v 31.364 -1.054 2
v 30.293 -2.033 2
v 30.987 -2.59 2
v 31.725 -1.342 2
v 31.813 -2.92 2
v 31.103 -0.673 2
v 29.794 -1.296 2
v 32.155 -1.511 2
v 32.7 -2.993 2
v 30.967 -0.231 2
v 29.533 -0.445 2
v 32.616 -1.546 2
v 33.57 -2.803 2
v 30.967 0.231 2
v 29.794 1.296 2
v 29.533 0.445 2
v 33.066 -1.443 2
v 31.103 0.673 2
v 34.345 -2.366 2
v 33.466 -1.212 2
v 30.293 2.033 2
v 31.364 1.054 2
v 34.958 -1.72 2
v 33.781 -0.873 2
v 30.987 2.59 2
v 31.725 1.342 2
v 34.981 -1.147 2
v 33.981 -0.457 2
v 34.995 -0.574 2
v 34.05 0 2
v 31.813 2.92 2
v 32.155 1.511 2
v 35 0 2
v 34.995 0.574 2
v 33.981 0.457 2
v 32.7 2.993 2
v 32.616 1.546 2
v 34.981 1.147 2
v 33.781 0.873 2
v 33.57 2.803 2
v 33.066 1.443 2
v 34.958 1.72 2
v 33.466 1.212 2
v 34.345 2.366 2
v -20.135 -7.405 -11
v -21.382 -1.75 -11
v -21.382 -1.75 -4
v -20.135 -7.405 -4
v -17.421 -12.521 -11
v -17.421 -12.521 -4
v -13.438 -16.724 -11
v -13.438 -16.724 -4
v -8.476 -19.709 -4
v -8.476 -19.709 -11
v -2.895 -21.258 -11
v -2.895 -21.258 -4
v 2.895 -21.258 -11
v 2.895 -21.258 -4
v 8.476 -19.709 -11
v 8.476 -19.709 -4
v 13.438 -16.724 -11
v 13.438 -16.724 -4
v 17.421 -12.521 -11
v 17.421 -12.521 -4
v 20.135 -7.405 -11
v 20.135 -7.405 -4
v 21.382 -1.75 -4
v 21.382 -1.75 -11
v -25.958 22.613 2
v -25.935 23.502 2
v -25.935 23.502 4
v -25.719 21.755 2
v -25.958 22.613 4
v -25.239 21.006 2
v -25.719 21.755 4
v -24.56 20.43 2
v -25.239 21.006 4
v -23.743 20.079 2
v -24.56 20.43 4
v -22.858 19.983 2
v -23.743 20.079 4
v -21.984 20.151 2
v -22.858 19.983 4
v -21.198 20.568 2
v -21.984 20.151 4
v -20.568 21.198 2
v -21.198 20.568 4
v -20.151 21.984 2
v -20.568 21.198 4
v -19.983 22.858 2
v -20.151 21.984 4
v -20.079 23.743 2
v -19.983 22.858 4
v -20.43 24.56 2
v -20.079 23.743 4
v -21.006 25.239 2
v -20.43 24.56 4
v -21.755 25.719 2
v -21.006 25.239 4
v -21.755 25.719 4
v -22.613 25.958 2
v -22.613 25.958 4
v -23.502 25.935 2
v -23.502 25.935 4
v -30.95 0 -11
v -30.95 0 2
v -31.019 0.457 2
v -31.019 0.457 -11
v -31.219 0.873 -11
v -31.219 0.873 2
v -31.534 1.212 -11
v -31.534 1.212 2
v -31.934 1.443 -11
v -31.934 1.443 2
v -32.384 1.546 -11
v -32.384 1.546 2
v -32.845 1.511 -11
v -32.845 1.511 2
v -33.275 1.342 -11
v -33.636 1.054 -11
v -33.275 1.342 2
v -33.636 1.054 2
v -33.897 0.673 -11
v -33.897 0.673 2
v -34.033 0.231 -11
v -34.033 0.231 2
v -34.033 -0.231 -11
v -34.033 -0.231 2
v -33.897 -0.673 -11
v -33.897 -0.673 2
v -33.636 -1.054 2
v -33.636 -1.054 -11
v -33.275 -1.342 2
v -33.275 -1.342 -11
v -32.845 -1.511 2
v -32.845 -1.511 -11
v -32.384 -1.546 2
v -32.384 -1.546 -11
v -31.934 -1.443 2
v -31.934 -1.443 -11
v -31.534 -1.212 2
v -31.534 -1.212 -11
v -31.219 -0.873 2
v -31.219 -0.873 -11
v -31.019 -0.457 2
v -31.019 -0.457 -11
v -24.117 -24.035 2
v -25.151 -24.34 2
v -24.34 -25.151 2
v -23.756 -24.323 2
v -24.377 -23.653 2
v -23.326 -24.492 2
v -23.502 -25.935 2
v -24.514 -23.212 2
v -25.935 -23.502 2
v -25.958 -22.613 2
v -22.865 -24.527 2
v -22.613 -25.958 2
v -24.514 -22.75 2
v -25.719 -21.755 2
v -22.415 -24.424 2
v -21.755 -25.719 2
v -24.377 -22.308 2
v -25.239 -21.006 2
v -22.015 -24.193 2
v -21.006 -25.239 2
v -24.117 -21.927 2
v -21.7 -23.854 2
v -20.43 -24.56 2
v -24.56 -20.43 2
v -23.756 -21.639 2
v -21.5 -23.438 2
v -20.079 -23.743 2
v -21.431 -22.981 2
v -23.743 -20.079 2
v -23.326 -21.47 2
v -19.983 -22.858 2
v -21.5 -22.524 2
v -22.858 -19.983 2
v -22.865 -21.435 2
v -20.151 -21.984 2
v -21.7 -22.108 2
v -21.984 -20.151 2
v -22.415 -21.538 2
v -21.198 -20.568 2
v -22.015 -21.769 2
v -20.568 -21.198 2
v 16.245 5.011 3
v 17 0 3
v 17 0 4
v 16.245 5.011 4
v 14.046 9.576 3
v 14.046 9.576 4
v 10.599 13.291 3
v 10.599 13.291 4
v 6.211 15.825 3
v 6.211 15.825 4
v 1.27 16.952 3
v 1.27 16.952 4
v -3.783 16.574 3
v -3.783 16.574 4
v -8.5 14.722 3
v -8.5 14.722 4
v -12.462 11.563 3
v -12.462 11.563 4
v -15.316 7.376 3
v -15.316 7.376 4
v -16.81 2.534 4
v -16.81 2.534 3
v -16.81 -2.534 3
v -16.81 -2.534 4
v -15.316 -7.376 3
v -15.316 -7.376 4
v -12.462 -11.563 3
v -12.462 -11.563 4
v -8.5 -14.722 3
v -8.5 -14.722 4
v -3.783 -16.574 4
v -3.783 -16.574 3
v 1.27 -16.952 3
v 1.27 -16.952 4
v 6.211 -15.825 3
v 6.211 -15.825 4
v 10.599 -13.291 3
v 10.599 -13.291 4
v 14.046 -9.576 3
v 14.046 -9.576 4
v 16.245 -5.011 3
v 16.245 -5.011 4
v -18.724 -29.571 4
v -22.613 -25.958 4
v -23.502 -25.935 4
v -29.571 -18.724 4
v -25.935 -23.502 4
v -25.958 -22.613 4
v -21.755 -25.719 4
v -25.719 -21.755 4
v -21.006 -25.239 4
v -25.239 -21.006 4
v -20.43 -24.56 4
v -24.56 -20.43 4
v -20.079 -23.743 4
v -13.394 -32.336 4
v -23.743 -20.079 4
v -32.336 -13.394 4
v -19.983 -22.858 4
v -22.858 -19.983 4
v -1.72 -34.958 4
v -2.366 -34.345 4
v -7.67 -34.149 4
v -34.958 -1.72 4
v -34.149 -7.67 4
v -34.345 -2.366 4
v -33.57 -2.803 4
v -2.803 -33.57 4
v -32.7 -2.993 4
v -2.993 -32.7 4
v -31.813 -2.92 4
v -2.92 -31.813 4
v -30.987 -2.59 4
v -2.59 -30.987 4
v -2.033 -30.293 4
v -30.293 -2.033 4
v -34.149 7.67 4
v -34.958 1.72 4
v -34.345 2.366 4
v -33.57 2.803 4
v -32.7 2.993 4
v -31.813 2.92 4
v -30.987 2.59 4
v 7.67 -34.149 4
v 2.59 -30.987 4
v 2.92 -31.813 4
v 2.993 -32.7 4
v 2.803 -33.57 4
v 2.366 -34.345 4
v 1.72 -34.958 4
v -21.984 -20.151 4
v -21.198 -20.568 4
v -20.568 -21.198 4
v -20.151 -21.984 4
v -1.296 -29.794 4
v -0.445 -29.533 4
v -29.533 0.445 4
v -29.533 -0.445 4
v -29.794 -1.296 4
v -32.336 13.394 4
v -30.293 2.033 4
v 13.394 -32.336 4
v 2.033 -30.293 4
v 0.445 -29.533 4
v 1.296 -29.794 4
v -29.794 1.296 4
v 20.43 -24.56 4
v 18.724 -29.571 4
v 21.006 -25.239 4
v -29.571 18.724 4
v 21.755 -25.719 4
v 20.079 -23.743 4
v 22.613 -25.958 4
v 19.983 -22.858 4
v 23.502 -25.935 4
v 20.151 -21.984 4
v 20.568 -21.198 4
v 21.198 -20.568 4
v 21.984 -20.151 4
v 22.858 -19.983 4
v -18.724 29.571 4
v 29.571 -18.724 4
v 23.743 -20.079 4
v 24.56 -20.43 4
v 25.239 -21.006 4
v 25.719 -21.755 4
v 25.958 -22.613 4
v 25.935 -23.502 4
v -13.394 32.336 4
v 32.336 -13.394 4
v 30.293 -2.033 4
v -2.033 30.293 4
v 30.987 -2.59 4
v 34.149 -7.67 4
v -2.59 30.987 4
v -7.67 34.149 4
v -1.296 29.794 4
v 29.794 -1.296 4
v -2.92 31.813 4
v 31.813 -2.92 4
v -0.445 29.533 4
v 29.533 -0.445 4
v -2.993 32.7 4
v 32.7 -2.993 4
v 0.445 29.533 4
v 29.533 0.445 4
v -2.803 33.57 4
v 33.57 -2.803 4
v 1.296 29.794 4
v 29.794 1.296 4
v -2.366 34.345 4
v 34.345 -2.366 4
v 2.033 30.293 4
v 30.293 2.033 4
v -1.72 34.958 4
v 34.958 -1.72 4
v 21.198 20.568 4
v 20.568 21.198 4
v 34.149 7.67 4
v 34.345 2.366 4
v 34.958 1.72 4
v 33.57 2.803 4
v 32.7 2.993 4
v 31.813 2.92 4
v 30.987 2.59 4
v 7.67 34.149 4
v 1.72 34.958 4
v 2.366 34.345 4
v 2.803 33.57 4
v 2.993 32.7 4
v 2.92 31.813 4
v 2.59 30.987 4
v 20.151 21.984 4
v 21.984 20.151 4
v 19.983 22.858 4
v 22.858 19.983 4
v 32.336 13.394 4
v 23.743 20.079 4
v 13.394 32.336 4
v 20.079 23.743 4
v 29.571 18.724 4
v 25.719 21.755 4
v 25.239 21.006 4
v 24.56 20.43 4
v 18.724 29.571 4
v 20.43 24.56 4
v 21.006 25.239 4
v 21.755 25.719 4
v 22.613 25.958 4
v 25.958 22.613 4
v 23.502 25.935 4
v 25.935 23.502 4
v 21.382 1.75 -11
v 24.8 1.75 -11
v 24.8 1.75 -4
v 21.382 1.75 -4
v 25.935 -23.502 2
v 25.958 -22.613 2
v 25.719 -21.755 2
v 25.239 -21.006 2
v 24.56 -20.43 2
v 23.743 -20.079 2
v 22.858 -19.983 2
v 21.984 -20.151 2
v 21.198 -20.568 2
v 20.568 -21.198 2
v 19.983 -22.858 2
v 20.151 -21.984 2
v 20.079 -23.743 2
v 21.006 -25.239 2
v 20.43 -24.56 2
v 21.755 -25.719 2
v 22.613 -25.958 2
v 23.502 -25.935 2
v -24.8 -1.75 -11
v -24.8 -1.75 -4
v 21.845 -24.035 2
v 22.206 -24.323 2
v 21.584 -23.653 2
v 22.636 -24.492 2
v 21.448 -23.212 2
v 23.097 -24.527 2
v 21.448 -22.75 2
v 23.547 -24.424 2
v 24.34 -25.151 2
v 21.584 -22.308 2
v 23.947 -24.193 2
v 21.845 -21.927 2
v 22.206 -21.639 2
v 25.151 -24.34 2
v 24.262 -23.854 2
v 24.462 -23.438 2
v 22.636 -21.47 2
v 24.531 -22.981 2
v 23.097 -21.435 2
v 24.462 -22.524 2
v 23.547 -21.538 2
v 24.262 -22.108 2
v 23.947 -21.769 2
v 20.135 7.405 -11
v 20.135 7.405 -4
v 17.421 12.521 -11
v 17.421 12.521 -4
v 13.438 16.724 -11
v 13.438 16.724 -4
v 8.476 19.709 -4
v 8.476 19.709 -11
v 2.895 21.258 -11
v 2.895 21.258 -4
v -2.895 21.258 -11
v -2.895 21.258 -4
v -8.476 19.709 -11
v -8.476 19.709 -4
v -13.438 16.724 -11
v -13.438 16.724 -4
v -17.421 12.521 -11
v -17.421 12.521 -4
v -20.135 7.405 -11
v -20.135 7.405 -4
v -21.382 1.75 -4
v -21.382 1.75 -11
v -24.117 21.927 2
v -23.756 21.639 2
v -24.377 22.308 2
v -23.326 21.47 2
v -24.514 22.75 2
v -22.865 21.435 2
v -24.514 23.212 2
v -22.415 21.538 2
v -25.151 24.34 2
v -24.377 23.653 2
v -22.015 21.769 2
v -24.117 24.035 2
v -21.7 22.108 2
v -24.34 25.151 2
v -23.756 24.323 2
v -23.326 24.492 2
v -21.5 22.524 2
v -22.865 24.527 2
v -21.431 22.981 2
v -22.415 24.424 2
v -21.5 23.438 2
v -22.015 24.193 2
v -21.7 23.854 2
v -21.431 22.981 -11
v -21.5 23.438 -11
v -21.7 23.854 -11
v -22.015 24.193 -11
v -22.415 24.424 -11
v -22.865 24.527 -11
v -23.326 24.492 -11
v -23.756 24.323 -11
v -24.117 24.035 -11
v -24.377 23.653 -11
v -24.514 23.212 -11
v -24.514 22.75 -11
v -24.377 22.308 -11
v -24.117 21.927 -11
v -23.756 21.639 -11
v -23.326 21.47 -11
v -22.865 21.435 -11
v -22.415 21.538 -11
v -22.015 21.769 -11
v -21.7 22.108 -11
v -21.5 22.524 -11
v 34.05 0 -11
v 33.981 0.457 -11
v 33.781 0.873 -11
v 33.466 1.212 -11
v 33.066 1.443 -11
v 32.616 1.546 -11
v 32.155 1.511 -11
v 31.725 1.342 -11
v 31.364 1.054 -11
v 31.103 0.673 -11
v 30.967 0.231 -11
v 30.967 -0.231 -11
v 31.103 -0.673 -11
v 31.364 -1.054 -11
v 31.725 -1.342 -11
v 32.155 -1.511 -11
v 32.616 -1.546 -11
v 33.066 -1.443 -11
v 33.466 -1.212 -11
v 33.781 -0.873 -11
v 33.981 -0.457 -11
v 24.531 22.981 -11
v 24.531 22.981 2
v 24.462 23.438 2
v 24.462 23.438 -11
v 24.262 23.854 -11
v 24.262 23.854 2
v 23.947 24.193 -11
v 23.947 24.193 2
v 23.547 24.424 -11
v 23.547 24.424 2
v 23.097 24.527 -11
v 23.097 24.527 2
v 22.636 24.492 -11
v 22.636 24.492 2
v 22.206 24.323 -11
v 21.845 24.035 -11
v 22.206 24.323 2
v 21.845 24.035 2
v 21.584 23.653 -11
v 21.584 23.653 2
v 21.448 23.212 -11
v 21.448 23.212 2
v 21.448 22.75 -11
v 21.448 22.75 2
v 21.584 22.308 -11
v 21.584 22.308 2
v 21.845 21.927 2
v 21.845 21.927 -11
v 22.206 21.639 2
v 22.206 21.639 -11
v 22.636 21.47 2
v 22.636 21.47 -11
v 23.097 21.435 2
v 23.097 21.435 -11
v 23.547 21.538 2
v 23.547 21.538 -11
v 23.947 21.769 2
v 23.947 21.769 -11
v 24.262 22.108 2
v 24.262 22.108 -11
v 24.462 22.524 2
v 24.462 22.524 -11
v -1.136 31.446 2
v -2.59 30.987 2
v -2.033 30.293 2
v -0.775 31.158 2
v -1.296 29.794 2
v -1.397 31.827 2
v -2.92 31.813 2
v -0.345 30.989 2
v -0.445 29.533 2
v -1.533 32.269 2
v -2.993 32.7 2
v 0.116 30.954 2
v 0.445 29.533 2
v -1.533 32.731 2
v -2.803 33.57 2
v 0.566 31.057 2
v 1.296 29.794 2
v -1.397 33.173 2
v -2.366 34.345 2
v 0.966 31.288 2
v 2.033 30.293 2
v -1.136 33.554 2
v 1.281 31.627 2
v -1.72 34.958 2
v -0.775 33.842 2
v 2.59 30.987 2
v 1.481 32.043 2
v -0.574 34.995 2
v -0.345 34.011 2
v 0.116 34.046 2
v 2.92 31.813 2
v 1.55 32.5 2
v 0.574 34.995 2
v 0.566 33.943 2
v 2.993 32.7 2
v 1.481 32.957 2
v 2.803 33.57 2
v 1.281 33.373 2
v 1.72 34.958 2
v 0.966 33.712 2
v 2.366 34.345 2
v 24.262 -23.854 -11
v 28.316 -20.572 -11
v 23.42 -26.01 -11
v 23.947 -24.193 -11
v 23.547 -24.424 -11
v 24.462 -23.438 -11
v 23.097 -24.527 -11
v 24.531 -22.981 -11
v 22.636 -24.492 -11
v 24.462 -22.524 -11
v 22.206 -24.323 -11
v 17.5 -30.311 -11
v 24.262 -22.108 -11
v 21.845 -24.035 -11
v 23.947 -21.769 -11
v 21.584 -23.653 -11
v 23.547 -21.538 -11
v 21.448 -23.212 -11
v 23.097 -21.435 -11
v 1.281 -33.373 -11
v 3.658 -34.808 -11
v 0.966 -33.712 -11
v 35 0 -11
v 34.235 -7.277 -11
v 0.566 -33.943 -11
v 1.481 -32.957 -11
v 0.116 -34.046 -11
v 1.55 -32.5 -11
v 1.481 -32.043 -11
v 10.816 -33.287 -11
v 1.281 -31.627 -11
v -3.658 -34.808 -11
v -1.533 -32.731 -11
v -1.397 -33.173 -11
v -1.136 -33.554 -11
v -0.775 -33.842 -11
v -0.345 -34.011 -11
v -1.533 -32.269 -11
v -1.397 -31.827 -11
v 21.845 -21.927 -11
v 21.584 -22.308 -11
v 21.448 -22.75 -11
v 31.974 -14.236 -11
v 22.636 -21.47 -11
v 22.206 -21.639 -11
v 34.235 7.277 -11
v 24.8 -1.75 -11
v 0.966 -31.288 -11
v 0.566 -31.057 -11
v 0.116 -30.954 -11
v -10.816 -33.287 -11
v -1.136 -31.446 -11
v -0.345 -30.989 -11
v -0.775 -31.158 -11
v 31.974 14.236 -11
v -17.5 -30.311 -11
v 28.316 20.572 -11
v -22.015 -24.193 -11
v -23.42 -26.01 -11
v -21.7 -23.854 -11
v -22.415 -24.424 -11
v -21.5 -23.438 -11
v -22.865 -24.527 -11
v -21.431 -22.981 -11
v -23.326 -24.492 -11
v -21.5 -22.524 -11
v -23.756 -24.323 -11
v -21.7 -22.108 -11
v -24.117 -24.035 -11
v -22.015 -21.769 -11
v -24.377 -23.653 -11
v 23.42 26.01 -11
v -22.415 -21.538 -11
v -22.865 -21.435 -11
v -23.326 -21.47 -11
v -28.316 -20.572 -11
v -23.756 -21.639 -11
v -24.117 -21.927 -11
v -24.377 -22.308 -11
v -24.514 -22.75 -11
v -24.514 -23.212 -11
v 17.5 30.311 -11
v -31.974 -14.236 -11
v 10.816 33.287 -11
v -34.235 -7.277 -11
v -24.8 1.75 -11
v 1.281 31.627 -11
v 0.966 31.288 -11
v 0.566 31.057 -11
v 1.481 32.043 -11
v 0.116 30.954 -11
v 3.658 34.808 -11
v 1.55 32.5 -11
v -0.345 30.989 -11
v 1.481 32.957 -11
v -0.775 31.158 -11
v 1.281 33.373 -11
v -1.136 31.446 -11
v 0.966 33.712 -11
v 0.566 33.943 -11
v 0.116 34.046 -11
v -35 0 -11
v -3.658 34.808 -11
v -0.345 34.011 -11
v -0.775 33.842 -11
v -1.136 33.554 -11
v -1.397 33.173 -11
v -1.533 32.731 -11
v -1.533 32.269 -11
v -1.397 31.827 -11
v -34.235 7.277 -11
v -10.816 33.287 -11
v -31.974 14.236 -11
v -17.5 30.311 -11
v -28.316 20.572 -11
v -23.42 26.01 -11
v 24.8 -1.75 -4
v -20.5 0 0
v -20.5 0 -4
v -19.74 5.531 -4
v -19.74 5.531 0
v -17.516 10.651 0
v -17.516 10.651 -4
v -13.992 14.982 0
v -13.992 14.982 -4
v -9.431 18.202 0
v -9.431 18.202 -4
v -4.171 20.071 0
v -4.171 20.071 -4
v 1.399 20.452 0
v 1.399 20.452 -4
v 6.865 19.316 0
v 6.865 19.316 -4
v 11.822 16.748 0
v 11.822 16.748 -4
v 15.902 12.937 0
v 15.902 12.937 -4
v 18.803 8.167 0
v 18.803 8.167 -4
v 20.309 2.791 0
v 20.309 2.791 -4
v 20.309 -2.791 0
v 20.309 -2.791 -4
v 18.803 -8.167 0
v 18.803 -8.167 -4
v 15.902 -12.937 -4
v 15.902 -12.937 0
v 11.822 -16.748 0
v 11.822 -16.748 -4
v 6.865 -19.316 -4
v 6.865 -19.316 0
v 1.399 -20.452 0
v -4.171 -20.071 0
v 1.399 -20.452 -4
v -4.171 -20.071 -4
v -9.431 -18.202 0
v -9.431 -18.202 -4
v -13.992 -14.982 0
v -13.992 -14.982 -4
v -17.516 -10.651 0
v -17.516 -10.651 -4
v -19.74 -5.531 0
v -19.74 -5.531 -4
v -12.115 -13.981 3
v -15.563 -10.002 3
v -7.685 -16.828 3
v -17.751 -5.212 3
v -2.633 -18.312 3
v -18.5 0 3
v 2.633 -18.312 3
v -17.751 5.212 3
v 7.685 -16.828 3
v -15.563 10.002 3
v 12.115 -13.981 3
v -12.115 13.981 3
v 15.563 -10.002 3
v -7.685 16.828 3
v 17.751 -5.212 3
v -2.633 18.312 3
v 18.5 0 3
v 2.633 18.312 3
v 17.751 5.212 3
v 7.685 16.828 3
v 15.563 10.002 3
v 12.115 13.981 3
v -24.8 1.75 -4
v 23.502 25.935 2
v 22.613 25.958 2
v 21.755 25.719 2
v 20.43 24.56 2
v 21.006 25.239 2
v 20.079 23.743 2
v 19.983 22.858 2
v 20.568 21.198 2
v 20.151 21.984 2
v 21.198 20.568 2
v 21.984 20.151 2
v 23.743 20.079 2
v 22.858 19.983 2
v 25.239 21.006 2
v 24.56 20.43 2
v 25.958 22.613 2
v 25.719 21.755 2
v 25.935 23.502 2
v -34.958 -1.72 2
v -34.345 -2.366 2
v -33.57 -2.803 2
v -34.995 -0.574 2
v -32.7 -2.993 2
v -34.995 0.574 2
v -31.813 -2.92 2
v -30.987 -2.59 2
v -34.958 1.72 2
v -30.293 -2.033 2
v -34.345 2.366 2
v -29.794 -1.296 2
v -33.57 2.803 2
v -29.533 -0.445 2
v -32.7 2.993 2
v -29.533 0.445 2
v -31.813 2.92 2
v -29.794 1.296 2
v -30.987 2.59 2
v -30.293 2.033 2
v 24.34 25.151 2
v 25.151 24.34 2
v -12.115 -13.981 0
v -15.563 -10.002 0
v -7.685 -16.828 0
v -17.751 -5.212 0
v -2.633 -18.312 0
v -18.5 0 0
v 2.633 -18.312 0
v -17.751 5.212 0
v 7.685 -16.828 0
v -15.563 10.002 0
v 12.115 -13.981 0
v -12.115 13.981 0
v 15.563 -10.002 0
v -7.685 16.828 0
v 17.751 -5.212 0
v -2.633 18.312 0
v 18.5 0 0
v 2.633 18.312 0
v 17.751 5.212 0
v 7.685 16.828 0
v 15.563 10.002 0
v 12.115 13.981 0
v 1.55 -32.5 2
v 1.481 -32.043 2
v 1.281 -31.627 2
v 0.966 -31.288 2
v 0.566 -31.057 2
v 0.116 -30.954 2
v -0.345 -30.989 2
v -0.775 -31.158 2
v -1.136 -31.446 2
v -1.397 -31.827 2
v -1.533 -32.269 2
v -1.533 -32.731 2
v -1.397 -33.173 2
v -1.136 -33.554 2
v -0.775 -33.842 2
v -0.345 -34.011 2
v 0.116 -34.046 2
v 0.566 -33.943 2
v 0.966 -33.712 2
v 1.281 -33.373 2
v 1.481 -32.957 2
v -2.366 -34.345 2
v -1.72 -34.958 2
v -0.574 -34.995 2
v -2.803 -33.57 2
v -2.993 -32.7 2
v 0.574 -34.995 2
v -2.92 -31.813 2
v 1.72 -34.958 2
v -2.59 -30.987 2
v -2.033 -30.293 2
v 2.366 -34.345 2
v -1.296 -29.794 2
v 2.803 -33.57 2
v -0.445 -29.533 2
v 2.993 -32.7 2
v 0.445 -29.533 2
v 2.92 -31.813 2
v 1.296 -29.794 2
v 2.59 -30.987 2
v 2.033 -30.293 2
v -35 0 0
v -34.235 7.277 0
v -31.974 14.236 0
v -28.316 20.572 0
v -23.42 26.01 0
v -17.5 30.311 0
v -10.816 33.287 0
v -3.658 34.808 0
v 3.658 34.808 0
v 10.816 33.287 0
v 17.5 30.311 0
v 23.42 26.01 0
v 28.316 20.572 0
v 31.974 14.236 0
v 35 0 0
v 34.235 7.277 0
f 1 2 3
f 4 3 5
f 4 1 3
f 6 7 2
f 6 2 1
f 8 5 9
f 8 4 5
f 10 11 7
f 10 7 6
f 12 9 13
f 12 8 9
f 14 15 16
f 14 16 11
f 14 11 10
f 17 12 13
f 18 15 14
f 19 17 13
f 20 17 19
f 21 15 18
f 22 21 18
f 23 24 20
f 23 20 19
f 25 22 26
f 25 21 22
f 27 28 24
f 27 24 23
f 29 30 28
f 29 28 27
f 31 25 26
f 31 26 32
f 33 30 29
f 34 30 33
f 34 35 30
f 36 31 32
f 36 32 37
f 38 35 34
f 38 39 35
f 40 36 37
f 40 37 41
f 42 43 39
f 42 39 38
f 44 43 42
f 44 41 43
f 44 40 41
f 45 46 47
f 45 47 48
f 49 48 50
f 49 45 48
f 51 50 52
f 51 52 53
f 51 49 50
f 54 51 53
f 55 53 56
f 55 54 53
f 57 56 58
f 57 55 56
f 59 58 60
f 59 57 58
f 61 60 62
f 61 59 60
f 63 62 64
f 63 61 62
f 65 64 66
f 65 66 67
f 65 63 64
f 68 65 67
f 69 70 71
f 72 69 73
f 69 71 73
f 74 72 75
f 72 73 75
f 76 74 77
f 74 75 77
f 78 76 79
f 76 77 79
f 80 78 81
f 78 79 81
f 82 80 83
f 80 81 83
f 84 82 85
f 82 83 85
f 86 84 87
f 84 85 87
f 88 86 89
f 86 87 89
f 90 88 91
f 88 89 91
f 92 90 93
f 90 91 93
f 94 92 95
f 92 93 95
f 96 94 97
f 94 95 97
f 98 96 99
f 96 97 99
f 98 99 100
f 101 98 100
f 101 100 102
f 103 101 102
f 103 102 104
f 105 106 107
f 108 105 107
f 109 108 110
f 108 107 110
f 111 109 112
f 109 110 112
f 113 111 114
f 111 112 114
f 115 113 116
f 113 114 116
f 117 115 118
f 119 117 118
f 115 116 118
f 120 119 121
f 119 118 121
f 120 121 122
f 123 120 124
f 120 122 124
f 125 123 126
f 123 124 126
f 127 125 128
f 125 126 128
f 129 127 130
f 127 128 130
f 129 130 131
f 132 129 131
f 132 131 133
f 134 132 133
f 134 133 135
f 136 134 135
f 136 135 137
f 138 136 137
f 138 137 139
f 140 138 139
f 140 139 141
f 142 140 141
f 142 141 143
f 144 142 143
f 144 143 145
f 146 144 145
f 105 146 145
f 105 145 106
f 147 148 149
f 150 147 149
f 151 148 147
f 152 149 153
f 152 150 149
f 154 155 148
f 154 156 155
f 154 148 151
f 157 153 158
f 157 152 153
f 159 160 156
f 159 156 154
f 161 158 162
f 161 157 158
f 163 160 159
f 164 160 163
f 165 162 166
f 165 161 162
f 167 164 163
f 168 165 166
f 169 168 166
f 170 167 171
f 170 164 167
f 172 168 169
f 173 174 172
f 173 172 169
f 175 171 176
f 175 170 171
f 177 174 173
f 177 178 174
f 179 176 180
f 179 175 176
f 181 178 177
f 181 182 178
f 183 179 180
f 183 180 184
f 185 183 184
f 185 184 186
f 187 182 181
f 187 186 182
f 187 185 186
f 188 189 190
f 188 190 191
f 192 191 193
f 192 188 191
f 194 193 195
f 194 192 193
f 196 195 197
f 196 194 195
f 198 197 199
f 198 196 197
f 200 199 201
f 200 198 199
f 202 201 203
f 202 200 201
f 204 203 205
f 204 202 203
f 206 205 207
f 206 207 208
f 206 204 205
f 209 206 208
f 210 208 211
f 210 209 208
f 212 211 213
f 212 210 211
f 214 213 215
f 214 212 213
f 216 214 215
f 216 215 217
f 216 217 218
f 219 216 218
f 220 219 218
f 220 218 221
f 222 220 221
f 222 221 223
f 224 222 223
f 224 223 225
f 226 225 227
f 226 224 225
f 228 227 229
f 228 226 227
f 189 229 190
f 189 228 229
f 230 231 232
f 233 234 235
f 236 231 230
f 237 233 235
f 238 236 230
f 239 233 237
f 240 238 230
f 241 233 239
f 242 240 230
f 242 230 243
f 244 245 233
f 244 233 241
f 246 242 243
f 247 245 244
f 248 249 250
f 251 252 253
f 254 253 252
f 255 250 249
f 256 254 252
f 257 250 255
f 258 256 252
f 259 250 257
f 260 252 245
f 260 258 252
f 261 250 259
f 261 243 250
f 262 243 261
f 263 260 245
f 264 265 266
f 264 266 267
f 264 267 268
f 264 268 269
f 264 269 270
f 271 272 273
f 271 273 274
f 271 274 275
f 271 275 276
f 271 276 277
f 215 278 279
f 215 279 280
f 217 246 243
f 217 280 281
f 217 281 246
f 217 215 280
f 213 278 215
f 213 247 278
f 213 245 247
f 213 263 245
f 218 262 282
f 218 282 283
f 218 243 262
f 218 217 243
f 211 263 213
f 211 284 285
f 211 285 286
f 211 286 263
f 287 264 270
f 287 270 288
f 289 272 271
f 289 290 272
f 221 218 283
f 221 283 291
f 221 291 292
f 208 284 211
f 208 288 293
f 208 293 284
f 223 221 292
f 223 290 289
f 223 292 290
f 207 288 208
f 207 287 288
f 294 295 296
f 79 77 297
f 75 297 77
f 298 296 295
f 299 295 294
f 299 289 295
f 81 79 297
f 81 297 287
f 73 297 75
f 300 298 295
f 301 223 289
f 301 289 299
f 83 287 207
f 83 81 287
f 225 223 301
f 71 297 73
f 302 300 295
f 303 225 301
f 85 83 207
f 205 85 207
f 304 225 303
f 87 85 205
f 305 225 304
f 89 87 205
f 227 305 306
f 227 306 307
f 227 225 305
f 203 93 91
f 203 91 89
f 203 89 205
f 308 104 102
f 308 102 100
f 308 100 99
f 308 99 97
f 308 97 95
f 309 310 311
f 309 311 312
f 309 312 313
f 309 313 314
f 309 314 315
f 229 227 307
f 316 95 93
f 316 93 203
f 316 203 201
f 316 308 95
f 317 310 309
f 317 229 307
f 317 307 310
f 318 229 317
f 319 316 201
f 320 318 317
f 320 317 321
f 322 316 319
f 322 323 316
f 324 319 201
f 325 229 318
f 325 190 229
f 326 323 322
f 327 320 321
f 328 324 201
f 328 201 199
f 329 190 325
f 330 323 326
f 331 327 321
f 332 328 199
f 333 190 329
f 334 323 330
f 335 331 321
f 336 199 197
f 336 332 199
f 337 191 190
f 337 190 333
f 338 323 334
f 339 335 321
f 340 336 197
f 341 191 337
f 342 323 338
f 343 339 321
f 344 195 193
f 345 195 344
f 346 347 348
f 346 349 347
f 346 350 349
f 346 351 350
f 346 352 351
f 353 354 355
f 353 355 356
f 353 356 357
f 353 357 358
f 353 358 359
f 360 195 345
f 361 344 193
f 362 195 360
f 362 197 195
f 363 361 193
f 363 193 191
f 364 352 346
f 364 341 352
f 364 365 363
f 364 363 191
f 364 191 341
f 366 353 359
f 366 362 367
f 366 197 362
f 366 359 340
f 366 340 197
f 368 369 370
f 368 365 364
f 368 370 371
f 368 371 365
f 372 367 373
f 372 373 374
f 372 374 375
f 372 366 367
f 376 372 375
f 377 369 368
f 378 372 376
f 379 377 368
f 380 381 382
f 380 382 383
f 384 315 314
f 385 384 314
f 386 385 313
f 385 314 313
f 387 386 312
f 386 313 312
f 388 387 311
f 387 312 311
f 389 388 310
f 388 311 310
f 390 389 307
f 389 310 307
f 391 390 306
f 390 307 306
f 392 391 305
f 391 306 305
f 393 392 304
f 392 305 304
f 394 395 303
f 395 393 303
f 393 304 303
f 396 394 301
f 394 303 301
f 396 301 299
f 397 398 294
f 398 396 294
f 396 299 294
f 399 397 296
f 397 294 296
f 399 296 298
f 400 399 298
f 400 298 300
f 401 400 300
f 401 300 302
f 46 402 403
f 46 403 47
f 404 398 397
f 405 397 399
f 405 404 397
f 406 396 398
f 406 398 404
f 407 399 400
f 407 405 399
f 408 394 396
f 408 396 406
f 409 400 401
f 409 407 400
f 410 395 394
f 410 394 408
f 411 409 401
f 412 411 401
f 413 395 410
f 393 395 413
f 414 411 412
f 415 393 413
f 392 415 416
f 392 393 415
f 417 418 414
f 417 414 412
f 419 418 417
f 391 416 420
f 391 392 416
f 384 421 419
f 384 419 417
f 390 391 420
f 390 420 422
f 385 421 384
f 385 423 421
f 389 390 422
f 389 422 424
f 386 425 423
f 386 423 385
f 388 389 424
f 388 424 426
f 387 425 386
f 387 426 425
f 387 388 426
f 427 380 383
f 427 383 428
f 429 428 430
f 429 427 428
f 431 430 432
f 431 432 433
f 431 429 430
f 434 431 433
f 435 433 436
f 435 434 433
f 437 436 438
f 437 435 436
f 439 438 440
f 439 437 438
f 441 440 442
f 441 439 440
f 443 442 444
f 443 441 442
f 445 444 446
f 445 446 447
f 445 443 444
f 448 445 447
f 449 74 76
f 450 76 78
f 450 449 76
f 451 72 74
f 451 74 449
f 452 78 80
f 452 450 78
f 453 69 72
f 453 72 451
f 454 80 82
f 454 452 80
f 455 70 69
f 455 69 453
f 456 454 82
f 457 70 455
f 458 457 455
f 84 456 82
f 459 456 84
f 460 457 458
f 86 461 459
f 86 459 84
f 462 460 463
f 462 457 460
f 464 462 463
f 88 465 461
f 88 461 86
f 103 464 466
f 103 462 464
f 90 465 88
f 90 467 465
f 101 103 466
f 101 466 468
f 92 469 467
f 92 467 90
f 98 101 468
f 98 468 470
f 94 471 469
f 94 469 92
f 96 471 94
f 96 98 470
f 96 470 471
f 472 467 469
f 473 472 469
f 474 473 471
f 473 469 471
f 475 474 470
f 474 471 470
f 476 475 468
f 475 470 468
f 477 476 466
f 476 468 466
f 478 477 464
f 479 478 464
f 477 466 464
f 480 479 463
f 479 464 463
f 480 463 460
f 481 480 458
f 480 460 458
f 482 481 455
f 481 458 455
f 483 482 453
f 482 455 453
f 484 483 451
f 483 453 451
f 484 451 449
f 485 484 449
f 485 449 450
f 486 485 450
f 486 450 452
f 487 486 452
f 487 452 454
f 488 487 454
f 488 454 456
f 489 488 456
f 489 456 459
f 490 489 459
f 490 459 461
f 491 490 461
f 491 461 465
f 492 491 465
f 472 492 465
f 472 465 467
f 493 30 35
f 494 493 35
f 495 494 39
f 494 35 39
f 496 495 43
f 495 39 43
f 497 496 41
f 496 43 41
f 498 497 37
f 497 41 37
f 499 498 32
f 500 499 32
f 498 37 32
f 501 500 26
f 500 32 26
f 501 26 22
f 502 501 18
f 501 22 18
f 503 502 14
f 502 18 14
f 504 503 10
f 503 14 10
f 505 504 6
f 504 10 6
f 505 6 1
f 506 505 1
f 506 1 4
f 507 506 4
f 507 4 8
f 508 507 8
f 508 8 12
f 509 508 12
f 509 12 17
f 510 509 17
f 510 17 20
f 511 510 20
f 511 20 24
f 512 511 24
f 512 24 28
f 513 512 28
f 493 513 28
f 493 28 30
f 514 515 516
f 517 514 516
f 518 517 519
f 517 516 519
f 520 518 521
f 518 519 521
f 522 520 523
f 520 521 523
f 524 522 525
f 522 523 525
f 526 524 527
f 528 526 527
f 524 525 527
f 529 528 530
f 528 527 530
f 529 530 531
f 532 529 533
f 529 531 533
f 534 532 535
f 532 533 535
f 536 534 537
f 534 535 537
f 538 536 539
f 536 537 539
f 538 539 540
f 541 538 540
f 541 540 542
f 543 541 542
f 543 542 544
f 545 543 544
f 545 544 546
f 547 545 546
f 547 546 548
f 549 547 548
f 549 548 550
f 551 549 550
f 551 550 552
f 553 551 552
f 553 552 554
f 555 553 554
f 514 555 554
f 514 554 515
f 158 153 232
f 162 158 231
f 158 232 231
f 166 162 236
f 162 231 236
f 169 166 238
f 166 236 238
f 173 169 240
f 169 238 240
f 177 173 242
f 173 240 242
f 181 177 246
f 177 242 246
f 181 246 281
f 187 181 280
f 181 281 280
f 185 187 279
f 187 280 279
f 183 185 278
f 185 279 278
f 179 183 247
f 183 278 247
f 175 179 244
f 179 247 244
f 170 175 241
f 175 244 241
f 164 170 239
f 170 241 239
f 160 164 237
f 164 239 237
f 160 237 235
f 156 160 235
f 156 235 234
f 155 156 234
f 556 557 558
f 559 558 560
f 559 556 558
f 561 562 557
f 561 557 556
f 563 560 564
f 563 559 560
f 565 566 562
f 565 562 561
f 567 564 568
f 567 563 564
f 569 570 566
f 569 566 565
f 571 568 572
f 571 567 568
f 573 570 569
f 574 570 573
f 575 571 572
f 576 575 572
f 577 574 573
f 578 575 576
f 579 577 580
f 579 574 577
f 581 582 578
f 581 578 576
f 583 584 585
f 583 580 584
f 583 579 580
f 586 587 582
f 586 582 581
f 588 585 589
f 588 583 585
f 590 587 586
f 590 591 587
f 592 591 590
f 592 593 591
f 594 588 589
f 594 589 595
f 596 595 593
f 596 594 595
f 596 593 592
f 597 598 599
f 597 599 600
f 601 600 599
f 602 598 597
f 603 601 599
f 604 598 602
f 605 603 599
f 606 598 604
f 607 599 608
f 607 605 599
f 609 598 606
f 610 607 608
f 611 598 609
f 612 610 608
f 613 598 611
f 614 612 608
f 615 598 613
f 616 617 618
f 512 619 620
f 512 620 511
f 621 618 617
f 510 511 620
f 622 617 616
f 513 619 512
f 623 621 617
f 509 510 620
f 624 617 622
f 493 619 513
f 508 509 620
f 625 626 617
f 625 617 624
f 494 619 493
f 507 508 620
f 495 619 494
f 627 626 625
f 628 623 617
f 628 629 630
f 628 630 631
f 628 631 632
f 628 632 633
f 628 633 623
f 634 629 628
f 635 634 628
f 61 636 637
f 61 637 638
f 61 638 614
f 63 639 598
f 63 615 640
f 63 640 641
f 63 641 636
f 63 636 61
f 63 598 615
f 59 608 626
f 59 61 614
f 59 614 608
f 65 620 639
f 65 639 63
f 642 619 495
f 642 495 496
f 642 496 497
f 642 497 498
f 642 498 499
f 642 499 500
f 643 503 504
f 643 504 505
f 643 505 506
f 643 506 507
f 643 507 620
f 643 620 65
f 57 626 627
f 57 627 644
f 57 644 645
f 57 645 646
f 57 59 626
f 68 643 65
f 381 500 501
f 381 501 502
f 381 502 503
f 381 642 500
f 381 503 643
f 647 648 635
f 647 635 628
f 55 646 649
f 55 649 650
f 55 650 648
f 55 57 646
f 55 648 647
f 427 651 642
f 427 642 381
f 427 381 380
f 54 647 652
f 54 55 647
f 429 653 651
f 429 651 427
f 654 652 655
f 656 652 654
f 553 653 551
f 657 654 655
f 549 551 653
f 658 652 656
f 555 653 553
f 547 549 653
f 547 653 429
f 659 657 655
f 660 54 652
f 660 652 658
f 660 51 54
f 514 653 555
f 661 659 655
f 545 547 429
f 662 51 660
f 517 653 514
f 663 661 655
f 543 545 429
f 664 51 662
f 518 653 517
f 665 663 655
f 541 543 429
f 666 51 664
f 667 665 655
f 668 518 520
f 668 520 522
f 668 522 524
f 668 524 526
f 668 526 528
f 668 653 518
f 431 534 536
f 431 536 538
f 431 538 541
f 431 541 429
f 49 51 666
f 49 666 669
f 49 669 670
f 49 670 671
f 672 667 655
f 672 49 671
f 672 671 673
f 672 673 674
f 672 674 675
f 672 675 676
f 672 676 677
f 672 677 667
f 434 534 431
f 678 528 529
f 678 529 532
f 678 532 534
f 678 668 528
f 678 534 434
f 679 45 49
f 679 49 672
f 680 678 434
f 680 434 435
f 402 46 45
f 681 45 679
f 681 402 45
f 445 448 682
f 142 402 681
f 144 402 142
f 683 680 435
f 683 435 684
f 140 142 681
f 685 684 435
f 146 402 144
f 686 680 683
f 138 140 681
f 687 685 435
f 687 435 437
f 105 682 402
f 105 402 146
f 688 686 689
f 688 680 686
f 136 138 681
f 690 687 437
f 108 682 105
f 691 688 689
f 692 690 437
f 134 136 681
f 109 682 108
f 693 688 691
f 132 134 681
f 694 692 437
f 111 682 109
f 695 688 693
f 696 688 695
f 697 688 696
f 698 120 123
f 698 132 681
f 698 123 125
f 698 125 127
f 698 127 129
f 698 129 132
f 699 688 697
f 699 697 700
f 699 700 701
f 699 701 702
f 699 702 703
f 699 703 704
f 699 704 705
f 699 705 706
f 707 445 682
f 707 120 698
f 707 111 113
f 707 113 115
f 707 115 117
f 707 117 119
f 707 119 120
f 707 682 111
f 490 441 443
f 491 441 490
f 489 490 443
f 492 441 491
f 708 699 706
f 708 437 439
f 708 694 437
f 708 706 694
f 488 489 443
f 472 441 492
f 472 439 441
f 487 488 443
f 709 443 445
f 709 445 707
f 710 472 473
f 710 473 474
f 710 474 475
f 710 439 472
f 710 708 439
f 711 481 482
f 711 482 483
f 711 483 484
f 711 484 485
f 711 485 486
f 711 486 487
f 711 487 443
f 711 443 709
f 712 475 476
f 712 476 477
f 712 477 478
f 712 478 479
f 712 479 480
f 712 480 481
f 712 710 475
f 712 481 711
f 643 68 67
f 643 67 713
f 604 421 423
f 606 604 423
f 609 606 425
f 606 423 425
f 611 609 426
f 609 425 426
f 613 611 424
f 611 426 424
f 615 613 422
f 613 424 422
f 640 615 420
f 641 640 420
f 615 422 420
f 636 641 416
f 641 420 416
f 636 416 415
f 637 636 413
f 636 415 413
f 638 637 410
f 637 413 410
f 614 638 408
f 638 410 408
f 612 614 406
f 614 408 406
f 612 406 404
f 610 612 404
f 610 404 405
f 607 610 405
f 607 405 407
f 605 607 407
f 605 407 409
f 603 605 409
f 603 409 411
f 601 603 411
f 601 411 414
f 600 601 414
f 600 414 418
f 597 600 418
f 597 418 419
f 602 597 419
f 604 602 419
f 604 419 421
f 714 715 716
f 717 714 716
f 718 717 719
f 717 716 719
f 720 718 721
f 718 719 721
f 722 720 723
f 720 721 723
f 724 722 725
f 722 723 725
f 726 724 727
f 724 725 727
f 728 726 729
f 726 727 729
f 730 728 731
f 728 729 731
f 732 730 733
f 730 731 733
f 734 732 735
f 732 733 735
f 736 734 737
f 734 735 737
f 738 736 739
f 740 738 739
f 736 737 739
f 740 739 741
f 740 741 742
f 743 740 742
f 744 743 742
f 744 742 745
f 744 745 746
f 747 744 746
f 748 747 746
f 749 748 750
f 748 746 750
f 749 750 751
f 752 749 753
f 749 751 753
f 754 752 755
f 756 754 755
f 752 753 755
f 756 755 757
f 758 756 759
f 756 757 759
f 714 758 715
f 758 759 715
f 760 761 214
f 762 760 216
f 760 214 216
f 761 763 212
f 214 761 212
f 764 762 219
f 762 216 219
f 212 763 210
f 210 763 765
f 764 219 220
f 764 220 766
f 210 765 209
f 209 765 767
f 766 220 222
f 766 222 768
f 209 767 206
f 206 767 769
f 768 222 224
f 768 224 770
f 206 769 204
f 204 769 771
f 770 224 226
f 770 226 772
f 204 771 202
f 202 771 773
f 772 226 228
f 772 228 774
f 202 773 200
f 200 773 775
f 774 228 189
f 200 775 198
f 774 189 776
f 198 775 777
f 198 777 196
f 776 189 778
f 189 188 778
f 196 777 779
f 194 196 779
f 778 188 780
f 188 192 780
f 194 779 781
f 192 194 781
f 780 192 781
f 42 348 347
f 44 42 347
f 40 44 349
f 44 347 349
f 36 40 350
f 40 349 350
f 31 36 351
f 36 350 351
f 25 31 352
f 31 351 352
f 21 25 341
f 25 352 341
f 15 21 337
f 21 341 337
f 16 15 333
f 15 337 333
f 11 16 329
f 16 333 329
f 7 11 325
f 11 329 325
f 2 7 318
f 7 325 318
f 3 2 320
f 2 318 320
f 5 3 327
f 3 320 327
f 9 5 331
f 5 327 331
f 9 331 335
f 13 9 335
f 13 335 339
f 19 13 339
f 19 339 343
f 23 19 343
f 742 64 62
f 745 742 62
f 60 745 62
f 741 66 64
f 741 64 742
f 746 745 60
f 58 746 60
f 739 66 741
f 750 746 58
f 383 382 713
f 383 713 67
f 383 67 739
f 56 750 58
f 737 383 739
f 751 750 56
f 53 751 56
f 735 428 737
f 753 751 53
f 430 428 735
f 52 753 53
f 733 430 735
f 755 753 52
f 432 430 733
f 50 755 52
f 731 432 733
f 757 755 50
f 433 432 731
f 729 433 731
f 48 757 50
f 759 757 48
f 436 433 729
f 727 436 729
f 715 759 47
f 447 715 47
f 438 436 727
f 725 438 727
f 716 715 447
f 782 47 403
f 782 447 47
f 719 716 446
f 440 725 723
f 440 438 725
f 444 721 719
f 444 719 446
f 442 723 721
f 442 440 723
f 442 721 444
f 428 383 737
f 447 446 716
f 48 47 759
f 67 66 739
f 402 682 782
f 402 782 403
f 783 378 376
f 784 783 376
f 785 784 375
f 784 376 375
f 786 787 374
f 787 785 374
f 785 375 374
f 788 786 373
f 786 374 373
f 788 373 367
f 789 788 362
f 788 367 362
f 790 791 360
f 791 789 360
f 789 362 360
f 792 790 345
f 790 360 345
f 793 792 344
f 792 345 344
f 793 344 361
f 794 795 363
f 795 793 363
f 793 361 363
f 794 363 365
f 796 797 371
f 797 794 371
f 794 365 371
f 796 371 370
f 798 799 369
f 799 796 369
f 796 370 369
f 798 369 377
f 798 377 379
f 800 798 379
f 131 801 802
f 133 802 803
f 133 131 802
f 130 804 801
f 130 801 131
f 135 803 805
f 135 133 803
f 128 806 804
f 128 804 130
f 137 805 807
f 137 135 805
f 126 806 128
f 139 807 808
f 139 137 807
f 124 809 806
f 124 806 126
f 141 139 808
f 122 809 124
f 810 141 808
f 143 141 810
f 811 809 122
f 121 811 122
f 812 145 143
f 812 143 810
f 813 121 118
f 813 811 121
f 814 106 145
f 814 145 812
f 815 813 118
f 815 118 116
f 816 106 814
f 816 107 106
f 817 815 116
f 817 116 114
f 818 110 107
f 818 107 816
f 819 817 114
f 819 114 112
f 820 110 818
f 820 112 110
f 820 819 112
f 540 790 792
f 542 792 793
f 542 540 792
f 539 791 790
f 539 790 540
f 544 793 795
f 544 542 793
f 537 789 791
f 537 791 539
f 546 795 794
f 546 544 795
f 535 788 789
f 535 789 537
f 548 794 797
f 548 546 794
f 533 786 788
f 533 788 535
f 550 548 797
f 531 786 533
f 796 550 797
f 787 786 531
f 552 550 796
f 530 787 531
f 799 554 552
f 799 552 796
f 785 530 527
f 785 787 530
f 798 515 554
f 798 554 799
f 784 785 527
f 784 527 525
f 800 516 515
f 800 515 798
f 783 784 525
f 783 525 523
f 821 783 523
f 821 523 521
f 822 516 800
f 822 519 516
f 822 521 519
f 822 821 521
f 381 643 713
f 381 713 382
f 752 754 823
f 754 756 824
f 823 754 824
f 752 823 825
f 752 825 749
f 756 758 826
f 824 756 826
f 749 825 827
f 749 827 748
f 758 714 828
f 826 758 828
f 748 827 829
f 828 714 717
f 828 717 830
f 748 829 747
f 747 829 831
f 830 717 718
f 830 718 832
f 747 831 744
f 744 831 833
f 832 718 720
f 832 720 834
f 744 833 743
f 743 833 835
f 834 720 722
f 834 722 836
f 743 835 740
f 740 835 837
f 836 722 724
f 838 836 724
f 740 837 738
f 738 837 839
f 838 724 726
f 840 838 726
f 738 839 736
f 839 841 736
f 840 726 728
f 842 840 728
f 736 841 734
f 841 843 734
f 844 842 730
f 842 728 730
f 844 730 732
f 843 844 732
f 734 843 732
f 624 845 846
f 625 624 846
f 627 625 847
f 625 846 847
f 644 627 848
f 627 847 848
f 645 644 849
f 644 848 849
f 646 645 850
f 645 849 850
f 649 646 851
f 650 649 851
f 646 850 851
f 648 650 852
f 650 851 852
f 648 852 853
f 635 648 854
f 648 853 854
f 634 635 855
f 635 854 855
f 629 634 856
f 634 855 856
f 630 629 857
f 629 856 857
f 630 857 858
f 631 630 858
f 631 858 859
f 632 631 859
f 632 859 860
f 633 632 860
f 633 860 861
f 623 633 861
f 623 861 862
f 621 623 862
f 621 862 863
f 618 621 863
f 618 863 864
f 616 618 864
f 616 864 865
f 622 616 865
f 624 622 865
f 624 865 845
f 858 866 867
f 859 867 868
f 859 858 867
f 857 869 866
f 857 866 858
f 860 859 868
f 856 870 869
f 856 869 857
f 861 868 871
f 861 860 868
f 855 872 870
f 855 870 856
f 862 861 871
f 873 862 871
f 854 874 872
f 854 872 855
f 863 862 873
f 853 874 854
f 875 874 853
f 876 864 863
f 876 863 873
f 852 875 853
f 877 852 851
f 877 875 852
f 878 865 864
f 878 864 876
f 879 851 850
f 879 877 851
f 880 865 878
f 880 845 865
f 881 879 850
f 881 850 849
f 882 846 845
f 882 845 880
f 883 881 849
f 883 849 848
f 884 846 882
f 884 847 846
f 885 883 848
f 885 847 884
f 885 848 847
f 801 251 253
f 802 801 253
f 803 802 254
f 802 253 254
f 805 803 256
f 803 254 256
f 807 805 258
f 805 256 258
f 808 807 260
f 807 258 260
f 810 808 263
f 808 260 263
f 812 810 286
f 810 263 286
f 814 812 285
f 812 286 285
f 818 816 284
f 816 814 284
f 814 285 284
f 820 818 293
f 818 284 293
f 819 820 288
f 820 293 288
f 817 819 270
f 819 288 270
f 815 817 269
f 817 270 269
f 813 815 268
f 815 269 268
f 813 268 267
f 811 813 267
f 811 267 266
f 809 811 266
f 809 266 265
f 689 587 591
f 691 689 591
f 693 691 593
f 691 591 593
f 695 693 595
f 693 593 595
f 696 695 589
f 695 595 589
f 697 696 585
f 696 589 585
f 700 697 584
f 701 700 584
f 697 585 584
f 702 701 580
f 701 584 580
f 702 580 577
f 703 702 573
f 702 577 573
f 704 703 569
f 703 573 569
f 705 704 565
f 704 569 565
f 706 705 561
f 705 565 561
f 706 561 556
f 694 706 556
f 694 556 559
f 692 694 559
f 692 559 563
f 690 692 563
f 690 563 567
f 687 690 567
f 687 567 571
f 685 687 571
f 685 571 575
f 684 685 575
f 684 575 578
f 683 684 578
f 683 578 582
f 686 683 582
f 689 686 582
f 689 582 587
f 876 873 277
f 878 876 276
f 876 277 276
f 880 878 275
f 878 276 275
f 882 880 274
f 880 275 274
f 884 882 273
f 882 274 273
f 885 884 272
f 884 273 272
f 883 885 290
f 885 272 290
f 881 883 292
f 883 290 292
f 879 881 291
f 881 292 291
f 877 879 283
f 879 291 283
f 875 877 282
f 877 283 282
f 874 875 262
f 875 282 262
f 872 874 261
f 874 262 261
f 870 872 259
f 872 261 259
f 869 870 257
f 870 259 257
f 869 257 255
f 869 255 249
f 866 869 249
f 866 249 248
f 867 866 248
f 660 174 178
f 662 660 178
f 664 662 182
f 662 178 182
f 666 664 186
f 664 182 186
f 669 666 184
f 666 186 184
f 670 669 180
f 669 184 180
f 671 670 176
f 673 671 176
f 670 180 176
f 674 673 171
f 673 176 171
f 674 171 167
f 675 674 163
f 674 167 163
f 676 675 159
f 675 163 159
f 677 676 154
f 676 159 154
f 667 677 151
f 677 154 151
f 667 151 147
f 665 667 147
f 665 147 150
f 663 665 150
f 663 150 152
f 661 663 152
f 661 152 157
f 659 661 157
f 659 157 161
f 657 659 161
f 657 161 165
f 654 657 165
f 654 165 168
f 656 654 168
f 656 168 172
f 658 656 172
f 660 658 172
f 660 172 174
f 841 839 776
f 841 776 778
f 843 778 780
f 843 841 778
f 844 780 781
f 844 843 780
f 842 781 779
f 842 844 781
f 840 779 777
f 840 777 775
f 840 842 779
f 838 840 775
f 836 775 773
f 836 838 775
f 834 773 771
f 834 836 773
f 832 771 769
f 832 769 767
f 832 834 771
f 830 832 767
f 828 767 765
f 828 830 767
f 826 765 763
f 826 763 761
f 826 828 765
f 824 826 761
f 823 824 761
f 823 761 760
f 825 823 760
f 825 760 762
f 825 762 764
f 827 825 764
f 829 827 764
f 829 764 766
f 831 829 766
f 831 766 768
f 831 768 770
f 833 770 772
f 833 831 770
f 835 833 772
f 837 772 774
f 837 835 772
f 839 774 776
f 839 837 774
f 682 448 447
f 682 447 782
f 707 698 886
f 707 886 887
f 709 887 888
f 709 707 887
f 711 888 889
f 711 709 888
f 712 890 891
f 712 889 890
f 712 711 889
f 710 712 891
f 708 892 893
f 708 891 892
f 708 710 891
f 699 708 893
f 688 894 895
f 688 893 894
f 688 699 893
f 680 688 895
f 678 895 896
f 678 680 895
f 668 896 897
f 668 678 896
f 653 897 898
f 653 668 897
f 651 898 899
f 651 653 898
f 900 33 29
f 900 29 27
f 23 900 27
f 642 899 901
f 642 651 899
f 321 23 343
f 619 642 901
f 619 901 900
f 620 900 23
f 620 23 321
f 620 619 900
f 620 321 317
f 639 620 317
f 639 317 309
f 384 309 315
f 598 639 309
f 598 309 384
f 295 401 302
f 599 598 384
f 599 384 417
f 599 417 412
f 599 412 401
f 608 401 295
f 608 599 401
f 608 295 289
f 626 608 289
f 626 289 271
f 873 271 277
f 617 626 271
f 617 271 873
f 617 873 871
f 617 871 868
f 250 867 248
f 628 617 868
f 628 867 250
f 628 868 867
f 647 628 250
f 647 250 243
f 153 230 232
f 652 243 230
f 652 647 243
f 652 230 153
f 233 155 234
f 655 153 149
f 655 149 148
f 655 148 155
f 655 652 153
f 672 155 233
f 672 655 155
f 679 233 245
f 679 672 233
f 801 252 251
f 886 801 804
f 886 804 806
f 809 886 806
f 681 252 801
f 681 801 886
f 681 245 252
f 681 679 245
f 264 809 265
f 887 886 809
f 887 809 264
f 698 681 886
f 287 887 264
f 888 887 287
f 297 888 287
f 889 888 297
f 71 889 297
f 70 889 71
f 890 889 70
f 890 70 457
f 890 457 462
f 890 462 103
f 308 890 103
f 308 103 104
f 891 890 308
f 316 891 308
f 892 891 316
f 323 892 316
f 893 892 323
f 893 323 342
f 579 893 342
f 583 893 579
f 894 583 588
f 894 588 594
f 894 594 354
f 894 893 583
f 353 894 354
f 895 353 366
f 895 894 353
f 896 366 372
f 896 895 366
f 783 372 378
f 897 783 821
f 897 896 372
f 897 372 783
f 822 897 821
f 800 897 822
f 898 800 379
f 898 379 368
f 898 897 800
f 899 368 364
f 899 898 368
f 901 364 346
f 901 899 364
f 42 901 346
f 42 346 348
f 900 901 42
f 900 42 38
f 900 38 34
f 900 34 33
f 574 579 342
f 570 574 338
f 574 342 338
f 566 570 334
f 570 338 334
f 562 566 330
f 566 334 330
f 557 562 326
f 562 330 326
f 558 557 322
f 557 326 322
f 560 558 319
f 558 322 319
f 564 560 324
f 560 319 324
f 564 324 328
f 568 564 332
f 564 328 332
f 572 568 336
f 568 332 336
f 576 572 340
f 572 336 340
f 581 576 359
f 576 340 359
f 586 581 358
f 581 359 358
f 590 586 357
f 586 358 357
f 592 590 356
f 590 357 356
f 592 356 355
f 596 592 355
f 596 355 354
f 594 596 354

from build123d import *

# Parameters (mm, degrees)
SKETCH_1_R          = 35
SKETCH_1_R_2        = 18.5
EXTRUDE_1_DEPTH     = 3
SKETCH_5_R          = 35
SKETCH_5_R_2        = 17
EXTRUDE_3_DEPTH     = 1
EXTRUDE_START       = 4
SKETCH_7_R          = 35
SKETCH_7_R_2        = 21.45
EXTRUDE_4_DEPTH     = 4
EXTRUDE_START_2     = 7
SKETCH_9_R          = 35
EXTRUDE_6_DEPTH     = 7
SKETCH_12_R         = 1.55
CUT_EXTRUDE_1_DEPTH = 52.720402164
SKETCH_13_R         = 3
CUT_EXTRUDE_2_DEPTH = 2
SKETCH_15_R         = 1.55
CUT_EXTRUDE_3_DEPTH = 52.720402164
SKETCH_16_R         = 3
CUT_EXTRUDE_4_DEPTH = 2
SKETCH_17_R         = 21.45
SKETCH_17_R_2       = 20.5
EXTRUDE_7_DEPTH     = 4


with BuildPart() as part:
    # 草图1 → 凸台-拉伸1 (new body)
    with BuildSketch(Plane.XY):
        Circle(SKETCH_1_R)
        Circle(SKETCH_1_R_2, mode=Mode.SUBTRACT)
    extrude(amount=EXTRUDE_1_DEPTH)

    # 草图5 → 凸台-拉伸3 (add)
    with BuildSketch(Plane.XY.offset(3)):
        Circle(SKETCH_5_R)
        Circle(SKETCH_5_R_2, mode=Mode.SUBTRACT)
    extrude(amount=EXTRUDE_3_DEPTH)

    # 草图7 → 凸台-拉伸4 (add)
    with BuildSketch(Plane(origin=(0, 0, 0), x_dir=(-1, 0, 0), z_dir=(0, 0, -1)).offset(EXTRUDE_START)):
        Circle(SKETCH_7_R)
        Circle(SKETCH_7_R_2, mode=Mode.SUBTRACT)
    extrude(amount=-EXTRUDE_4_DEPTH)

    # 草图9 → 凸台-拉伸6 (add)
    with BuildSketch(Plane(origin=(0, 0, -4), x_dir=(-1, 0, 0), z_dir=(0, 0, -1)).offset(EXTRUDE_START_2)):
        Circle(SKETCH_9_R)
        with BuildLine():
            Line((24.8, 1.75), (24.8, 0))
            Line((24.8, 0), (24.8, -1.75))
            Line((24.8, -1.75), (21.382497565, -1.75))
            ThreePointArc((21.382497565, -1.75), (0, -21.453990354), (-21.382497565, -1.75))
            Line((-21.382497565, -1.75), (-24.8, -1.75))
            Line((-24.8, -1.75), (-24.8, 1.75))
            Line((-24.8, 1.75), (-21.382497565, 1.75))
            ThreePointArc((-21.382497565, 1.75), (0, 21.453990354), (21.382497565, 1.75))
            Line((21.382497565, 1.75), (24.8, 1.75))
        make_face(mode=Mode.SUBTRACT)
    extrude(amount=-EXTRUDE_6_DEPTH)

    # 草图12 → 切除-拉伸1 (cut, through all)
    with BuildSketch(Plane.XY.offset(4)):
        with Locations((0, 32.5)):
            Circle(SKETCH_12_R)
        with Locations((-32.5, 0)):
            Circle(SKETCH_12_R)
        with Locations((0, -32.5)):
            Circle(SKETCH_12_R)
        with Locations((32.5, 0)):
            Circle(SKETCH_12_R)
    extrude(amount=-CUT_EXTRUDE_1_DEPTH, mode=Mode.SUBTRACT)

    # 草图13 → 切除-拉伸2 (cut)
    with BuildSketch(Plane.XY.offset(4)):
        with Locations((0, 32.5)):
            Circle(SKETCH_13_R)
        with Locations((32.5, 0)):
            Circle(SKETCH_13_R)
        with Locations((0, -32.5)):
            Circle(SKETCH_13_R)
        with Locations((-32.5, 0)):
            Circle(SKETCH_13_R)
    extrude(amount=-CUT_EXTRUDE_2_DEPTH, mode=Mode.SUBTRACT)

    # 草图15 → 切除-拉伸3 (cut, through all)
    with BuildSketch(Plane.XY.offset(4)):
        with Locations((22.980970389, 22.980970389)):
            Circle(SKETCH_15_R)
        with Locations((22.980970389, -22.980970389)):
            Circle(SKETCH_15_R)
        with Locations((-22.980970389, -22.980970389)):
            Circle(SKETCH_15_R)
        with Locations((-22.980970389, 22.980970389)):
            Circle(SKETCH_15_R)
    extrude(amount=-CUT_EXTRUDE_3_DEPTH, mode=Mode.SUBTRACT)

    # 草图16 → 切除-拉伸4 (cut)
    with BuildSketch(Plane.XY.offset(4)):
        with Locations((22.980970389, 22.980970389)):
            Circle(SKETCH_16_R)
        with Locations((22.980970389, -22.980970389)):
            Circle(SKETCH_16_R)
        with Locations((-22.980970389, -22.980970389)):
            Circle(SKETCH_16_R)
        with Locations((-22.980970389, 22.980970389)):
            Circle(SKETCH_16_R)
    extrude(amount=-CUT_EXTRUDE_4_DEPTH, mode=Mode.SUBTRACT)

    # 草图17 → 凸台-拉伸7 (add)
    with BuildSketch(Plane(origin=(0, 0, 0), x_dir=(-1, 0, 0), z_dir=(0, 0, -1)).offset(EXTRUDE_START)):
        Circle(SKETCH_17_R)
        Circle(SKETCH_17_R_2, mode=Mode.SUBTRACT)
    extrude(amount=-EXTRUDE_7_DEPTH)


solid = part.part
